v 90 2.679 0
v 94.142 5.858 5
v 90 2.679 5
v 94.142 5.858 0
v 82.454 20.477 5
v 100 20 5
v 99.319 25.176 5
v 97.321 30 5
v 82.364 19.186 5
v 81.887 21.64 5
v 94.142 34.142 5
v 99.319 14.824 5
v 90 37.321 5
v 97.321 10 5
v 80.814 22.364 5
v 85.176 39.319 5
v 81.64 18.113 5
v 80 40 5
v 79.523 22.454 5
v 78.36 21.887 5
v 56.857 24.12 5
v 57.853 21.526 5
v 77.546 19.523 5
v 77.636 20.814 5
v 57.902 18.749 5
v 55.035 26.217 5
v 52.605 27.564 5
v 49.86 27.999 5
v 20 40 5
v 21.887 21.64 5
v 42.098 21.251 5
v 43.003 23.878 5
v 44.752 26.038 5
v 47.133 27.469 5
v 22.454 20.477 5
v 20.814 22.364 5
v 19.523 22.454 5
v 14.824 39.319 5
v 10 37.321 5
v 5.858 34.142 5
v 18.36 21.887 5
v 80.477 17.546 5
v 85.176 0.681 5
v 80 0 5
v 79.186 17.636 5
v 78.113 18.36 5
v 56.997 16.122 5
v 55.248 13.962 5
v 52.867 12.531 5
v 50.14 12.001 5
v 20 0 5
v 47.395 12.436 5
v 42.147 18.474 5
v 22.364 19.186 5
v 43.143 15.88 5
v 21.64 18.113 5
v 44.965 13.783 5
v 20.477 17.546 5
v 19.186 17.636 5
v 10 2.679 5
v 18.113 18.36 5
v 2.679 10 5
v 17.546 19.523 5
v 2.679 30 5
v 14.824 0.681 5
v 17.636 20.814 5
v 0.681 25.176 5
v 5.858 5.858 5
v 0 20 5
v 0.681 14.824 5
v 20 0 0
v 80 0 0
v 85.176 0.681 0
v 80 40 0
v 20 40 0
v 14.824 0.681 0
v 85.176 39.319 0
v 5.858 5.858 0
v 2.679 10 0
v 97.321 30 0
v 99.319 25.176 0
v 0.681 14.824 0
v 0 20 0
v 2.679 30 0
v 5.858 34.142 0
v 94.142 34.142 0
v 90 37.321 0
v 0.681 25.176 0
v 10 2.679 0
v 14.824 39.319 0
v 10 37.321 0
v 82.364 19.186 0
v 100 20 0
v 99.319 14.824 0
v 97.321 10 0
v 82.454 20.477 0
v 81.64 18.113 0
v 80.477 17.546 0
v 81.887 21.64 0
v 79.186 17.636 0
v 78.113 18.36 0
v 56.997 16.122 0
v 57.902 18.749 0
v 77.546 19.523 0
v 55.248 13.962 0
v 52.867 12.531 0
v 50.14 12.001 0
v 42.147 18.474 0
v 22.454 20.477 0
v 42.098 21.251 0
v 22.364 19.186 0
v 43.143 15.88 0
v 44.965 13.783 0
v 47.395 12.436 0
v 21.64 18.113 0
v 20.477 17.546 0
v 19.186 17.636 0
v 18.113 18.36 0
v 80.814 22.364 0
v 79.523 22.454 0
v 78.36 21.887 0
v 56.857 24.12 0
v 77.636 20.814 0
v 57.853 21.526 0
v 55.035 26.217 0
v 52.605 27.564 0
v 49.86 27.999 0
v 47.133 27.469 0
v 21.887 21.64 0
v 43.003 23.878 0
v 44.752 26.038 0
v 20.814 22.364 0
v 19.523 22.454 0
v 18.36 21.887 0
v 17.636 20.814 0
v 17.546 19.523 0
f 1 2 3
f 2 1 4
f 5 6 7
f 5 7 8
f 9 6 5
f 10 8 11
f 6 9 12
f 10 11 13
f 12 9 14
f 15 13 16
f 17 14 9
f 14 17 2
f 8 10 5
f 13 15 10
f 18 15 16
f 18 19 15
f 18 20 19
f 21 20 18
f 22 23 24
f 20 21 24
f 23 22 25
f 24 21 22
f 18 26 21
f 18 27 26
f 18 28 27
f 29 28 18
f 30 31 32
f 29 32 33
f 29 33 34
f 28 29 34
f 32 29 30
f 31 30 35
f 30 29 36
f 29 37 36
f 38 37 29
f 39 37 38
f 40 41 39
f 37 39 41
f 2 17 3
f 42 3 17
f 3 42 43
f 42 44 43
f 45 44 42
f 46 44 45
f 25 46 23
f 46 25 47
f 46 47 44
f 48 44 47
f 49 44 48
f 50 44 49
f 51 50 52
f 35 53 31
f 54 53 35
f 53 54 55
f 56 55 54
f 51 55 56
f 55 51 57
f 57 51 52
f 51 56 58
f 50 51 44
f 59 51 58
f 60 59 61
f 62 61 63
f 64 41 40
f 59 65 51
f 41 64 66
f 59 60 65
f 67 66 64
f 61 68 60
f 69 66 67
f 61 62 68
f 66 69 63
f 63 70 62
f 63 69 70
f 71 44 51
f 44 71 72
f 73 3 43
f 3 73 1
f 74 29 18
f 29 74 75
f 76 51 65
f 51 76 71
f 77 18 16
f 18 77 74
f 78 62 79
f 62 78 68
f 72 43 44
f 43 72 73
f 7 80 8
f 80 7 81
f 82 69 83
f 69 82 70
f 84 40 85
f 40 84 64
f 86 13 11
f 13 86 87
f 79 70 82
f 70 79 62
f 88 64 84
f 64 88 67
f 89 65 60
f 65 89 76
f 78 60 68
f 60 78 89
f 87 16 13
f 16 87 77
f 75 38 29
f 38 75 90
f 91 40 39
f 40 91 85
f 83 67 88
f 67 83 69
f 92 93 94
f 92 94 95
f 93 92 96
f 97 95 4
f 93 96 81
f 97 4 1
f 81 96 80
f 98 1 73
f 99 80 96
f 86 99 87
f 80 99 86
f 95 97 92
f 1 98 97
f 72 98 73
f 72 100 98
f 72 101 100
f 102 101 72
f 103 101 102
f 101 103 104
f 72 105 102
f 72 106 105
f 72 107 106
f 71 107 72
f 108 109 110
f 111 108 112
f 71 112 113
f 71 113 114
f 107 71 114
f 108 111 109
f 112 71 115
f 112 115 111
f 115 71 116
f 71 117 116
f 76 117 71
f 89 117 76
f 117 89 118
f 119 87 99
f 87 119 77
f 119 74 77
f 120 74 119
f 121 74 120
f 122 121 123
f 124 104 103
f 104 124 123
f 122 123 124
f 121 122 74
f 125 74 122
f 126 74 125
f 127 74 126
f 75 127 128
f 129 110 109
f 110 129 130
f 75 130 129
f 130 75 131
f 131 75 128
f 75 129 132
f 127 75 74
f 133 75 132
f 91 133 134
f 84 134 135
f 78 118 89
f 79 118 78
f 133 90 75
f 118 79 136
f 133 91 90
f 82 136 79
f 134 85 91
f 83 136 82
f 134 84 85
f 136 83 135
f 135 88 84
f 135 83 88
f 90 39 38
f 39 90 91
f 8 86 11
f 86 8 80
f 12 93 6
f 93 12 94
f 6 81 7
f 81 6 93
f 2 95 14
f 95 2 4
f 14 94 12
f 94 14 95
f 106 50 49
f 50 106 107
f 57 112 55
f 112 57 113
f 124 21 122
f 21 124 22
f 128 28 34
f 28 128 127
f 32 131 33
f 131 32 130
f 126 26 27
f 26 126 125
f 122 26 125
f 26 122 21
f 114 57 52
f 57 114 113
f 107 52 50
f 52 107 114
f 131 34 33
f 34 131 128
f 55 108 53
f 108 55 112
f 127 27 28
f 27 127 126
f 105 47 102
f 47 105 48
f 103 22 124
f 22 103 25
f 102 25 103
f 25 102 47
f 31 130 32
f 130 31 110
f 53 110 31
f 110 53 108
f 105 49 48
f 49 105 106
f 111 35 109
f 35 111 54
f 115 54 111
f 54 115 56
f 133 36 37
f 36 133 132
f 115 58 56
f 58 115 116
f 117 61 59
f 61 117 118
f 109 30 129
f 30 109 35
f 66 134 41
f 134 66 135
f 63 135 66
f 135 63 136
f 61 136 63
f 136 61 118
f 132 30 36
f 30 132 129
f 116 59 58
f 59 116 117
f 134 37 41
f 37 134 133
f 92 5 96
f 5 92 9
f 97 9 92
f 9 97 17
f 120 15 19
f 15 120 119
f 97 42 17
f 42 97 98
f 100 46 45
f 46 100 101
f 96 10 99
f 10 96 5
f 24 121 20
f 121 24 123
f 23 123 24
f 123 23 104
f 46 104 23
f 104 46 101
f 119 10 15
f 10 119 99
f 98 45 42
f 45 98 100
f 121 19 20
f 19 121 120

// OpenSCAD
$fn = 32;

// ----------------------------------------------------------------------
// Spacer plate: obround span 60, caps R20
// ----------------------------------------------------------------------

// --- parameters (mm) ---
bore_r = 8;               // centre bore radius
bolt_r = 2.5;             // bolt hole radius
plate_t = 5;              // plate thickness, Z (extrusion height)
span = 60;                // obround span
cap_r = 20;               // cap radius

profile = [[20, 40], [14.824, 39.319], [10, 37.321], [5.858, 34.142], [2.679, 30], [0.681, 25.176], [0, 20], [0.681, 14.824], [2.679, 10], [5.858, 5.858], [10, 2.679], [14.824, 0.681], [20, 0], [80, 0], [85.176, 0.681], [90, 2.679], [94.142, 5.858], [97.321, 10], [99.319, 14.824], [100, 20], [99.319, 25.176], [97.321, 30], [94.142, 34.142], [90, 37.321], [85.176, 39.319], [80, 40]];  // primary outline, 26 points, counter clockwise
void_1 = [[57.853, 21.526], [56.857, 24.12], [55.035, 26.217], [52.605, 27.564], [49.86, 27.999], [47.133, 27.469], [44.752, 26.038], [43.003, 23.878], [42.098, 21.251], [42.147, 18.474], [43.143, 15.88], [44.965, 13.783], [47.395, 12.436], [50.14, 12.001], [52.867, 12.531], [55.248, 13.962], [56.997, 16.122], [57.902, 18.749]];  // centre bore, 18 points
void_2 = [[22.454, 20.477], [21.887, 21.64], [20.814, 22.364], [19.523, 22.454], [18.36, 21.887], [17.636, 20.814], [17.546, 19.523], [18.113, 18.36], [19.186, 17.636], [20.477, 17.546], [21.64, 18.113], [22.364, 19.186]];  // end hole, 12 points
void_3 = [[82.454, 20.477], [81.887, 21.64], [80.814, 22.364], [79.523, 22.454], [78.36, 21.887], [77.636, 20.814], [77.546, 19.523], [78.113, 18.36], [79.186, 17.636], [80.477, 17.546], [81.64, 18.113], [82.364, 19.186]];  // end hole, 12 points

// --- the one profile operation ---
difference() {
  linear_extrude(height = plate_t) polygon(points = profile);
  translate([0, 0, -1])
    linear_extrude(height = plate_t + 2) polygon(points = void_1);
  translate([0, 0, -1])
    linear_extrude(height = plate_t + 2) polygon(points = void_2);
  translate([0, 0, -1])
    linear_extrude(height = plate_t + 2) polygon(points = void_3);
}
